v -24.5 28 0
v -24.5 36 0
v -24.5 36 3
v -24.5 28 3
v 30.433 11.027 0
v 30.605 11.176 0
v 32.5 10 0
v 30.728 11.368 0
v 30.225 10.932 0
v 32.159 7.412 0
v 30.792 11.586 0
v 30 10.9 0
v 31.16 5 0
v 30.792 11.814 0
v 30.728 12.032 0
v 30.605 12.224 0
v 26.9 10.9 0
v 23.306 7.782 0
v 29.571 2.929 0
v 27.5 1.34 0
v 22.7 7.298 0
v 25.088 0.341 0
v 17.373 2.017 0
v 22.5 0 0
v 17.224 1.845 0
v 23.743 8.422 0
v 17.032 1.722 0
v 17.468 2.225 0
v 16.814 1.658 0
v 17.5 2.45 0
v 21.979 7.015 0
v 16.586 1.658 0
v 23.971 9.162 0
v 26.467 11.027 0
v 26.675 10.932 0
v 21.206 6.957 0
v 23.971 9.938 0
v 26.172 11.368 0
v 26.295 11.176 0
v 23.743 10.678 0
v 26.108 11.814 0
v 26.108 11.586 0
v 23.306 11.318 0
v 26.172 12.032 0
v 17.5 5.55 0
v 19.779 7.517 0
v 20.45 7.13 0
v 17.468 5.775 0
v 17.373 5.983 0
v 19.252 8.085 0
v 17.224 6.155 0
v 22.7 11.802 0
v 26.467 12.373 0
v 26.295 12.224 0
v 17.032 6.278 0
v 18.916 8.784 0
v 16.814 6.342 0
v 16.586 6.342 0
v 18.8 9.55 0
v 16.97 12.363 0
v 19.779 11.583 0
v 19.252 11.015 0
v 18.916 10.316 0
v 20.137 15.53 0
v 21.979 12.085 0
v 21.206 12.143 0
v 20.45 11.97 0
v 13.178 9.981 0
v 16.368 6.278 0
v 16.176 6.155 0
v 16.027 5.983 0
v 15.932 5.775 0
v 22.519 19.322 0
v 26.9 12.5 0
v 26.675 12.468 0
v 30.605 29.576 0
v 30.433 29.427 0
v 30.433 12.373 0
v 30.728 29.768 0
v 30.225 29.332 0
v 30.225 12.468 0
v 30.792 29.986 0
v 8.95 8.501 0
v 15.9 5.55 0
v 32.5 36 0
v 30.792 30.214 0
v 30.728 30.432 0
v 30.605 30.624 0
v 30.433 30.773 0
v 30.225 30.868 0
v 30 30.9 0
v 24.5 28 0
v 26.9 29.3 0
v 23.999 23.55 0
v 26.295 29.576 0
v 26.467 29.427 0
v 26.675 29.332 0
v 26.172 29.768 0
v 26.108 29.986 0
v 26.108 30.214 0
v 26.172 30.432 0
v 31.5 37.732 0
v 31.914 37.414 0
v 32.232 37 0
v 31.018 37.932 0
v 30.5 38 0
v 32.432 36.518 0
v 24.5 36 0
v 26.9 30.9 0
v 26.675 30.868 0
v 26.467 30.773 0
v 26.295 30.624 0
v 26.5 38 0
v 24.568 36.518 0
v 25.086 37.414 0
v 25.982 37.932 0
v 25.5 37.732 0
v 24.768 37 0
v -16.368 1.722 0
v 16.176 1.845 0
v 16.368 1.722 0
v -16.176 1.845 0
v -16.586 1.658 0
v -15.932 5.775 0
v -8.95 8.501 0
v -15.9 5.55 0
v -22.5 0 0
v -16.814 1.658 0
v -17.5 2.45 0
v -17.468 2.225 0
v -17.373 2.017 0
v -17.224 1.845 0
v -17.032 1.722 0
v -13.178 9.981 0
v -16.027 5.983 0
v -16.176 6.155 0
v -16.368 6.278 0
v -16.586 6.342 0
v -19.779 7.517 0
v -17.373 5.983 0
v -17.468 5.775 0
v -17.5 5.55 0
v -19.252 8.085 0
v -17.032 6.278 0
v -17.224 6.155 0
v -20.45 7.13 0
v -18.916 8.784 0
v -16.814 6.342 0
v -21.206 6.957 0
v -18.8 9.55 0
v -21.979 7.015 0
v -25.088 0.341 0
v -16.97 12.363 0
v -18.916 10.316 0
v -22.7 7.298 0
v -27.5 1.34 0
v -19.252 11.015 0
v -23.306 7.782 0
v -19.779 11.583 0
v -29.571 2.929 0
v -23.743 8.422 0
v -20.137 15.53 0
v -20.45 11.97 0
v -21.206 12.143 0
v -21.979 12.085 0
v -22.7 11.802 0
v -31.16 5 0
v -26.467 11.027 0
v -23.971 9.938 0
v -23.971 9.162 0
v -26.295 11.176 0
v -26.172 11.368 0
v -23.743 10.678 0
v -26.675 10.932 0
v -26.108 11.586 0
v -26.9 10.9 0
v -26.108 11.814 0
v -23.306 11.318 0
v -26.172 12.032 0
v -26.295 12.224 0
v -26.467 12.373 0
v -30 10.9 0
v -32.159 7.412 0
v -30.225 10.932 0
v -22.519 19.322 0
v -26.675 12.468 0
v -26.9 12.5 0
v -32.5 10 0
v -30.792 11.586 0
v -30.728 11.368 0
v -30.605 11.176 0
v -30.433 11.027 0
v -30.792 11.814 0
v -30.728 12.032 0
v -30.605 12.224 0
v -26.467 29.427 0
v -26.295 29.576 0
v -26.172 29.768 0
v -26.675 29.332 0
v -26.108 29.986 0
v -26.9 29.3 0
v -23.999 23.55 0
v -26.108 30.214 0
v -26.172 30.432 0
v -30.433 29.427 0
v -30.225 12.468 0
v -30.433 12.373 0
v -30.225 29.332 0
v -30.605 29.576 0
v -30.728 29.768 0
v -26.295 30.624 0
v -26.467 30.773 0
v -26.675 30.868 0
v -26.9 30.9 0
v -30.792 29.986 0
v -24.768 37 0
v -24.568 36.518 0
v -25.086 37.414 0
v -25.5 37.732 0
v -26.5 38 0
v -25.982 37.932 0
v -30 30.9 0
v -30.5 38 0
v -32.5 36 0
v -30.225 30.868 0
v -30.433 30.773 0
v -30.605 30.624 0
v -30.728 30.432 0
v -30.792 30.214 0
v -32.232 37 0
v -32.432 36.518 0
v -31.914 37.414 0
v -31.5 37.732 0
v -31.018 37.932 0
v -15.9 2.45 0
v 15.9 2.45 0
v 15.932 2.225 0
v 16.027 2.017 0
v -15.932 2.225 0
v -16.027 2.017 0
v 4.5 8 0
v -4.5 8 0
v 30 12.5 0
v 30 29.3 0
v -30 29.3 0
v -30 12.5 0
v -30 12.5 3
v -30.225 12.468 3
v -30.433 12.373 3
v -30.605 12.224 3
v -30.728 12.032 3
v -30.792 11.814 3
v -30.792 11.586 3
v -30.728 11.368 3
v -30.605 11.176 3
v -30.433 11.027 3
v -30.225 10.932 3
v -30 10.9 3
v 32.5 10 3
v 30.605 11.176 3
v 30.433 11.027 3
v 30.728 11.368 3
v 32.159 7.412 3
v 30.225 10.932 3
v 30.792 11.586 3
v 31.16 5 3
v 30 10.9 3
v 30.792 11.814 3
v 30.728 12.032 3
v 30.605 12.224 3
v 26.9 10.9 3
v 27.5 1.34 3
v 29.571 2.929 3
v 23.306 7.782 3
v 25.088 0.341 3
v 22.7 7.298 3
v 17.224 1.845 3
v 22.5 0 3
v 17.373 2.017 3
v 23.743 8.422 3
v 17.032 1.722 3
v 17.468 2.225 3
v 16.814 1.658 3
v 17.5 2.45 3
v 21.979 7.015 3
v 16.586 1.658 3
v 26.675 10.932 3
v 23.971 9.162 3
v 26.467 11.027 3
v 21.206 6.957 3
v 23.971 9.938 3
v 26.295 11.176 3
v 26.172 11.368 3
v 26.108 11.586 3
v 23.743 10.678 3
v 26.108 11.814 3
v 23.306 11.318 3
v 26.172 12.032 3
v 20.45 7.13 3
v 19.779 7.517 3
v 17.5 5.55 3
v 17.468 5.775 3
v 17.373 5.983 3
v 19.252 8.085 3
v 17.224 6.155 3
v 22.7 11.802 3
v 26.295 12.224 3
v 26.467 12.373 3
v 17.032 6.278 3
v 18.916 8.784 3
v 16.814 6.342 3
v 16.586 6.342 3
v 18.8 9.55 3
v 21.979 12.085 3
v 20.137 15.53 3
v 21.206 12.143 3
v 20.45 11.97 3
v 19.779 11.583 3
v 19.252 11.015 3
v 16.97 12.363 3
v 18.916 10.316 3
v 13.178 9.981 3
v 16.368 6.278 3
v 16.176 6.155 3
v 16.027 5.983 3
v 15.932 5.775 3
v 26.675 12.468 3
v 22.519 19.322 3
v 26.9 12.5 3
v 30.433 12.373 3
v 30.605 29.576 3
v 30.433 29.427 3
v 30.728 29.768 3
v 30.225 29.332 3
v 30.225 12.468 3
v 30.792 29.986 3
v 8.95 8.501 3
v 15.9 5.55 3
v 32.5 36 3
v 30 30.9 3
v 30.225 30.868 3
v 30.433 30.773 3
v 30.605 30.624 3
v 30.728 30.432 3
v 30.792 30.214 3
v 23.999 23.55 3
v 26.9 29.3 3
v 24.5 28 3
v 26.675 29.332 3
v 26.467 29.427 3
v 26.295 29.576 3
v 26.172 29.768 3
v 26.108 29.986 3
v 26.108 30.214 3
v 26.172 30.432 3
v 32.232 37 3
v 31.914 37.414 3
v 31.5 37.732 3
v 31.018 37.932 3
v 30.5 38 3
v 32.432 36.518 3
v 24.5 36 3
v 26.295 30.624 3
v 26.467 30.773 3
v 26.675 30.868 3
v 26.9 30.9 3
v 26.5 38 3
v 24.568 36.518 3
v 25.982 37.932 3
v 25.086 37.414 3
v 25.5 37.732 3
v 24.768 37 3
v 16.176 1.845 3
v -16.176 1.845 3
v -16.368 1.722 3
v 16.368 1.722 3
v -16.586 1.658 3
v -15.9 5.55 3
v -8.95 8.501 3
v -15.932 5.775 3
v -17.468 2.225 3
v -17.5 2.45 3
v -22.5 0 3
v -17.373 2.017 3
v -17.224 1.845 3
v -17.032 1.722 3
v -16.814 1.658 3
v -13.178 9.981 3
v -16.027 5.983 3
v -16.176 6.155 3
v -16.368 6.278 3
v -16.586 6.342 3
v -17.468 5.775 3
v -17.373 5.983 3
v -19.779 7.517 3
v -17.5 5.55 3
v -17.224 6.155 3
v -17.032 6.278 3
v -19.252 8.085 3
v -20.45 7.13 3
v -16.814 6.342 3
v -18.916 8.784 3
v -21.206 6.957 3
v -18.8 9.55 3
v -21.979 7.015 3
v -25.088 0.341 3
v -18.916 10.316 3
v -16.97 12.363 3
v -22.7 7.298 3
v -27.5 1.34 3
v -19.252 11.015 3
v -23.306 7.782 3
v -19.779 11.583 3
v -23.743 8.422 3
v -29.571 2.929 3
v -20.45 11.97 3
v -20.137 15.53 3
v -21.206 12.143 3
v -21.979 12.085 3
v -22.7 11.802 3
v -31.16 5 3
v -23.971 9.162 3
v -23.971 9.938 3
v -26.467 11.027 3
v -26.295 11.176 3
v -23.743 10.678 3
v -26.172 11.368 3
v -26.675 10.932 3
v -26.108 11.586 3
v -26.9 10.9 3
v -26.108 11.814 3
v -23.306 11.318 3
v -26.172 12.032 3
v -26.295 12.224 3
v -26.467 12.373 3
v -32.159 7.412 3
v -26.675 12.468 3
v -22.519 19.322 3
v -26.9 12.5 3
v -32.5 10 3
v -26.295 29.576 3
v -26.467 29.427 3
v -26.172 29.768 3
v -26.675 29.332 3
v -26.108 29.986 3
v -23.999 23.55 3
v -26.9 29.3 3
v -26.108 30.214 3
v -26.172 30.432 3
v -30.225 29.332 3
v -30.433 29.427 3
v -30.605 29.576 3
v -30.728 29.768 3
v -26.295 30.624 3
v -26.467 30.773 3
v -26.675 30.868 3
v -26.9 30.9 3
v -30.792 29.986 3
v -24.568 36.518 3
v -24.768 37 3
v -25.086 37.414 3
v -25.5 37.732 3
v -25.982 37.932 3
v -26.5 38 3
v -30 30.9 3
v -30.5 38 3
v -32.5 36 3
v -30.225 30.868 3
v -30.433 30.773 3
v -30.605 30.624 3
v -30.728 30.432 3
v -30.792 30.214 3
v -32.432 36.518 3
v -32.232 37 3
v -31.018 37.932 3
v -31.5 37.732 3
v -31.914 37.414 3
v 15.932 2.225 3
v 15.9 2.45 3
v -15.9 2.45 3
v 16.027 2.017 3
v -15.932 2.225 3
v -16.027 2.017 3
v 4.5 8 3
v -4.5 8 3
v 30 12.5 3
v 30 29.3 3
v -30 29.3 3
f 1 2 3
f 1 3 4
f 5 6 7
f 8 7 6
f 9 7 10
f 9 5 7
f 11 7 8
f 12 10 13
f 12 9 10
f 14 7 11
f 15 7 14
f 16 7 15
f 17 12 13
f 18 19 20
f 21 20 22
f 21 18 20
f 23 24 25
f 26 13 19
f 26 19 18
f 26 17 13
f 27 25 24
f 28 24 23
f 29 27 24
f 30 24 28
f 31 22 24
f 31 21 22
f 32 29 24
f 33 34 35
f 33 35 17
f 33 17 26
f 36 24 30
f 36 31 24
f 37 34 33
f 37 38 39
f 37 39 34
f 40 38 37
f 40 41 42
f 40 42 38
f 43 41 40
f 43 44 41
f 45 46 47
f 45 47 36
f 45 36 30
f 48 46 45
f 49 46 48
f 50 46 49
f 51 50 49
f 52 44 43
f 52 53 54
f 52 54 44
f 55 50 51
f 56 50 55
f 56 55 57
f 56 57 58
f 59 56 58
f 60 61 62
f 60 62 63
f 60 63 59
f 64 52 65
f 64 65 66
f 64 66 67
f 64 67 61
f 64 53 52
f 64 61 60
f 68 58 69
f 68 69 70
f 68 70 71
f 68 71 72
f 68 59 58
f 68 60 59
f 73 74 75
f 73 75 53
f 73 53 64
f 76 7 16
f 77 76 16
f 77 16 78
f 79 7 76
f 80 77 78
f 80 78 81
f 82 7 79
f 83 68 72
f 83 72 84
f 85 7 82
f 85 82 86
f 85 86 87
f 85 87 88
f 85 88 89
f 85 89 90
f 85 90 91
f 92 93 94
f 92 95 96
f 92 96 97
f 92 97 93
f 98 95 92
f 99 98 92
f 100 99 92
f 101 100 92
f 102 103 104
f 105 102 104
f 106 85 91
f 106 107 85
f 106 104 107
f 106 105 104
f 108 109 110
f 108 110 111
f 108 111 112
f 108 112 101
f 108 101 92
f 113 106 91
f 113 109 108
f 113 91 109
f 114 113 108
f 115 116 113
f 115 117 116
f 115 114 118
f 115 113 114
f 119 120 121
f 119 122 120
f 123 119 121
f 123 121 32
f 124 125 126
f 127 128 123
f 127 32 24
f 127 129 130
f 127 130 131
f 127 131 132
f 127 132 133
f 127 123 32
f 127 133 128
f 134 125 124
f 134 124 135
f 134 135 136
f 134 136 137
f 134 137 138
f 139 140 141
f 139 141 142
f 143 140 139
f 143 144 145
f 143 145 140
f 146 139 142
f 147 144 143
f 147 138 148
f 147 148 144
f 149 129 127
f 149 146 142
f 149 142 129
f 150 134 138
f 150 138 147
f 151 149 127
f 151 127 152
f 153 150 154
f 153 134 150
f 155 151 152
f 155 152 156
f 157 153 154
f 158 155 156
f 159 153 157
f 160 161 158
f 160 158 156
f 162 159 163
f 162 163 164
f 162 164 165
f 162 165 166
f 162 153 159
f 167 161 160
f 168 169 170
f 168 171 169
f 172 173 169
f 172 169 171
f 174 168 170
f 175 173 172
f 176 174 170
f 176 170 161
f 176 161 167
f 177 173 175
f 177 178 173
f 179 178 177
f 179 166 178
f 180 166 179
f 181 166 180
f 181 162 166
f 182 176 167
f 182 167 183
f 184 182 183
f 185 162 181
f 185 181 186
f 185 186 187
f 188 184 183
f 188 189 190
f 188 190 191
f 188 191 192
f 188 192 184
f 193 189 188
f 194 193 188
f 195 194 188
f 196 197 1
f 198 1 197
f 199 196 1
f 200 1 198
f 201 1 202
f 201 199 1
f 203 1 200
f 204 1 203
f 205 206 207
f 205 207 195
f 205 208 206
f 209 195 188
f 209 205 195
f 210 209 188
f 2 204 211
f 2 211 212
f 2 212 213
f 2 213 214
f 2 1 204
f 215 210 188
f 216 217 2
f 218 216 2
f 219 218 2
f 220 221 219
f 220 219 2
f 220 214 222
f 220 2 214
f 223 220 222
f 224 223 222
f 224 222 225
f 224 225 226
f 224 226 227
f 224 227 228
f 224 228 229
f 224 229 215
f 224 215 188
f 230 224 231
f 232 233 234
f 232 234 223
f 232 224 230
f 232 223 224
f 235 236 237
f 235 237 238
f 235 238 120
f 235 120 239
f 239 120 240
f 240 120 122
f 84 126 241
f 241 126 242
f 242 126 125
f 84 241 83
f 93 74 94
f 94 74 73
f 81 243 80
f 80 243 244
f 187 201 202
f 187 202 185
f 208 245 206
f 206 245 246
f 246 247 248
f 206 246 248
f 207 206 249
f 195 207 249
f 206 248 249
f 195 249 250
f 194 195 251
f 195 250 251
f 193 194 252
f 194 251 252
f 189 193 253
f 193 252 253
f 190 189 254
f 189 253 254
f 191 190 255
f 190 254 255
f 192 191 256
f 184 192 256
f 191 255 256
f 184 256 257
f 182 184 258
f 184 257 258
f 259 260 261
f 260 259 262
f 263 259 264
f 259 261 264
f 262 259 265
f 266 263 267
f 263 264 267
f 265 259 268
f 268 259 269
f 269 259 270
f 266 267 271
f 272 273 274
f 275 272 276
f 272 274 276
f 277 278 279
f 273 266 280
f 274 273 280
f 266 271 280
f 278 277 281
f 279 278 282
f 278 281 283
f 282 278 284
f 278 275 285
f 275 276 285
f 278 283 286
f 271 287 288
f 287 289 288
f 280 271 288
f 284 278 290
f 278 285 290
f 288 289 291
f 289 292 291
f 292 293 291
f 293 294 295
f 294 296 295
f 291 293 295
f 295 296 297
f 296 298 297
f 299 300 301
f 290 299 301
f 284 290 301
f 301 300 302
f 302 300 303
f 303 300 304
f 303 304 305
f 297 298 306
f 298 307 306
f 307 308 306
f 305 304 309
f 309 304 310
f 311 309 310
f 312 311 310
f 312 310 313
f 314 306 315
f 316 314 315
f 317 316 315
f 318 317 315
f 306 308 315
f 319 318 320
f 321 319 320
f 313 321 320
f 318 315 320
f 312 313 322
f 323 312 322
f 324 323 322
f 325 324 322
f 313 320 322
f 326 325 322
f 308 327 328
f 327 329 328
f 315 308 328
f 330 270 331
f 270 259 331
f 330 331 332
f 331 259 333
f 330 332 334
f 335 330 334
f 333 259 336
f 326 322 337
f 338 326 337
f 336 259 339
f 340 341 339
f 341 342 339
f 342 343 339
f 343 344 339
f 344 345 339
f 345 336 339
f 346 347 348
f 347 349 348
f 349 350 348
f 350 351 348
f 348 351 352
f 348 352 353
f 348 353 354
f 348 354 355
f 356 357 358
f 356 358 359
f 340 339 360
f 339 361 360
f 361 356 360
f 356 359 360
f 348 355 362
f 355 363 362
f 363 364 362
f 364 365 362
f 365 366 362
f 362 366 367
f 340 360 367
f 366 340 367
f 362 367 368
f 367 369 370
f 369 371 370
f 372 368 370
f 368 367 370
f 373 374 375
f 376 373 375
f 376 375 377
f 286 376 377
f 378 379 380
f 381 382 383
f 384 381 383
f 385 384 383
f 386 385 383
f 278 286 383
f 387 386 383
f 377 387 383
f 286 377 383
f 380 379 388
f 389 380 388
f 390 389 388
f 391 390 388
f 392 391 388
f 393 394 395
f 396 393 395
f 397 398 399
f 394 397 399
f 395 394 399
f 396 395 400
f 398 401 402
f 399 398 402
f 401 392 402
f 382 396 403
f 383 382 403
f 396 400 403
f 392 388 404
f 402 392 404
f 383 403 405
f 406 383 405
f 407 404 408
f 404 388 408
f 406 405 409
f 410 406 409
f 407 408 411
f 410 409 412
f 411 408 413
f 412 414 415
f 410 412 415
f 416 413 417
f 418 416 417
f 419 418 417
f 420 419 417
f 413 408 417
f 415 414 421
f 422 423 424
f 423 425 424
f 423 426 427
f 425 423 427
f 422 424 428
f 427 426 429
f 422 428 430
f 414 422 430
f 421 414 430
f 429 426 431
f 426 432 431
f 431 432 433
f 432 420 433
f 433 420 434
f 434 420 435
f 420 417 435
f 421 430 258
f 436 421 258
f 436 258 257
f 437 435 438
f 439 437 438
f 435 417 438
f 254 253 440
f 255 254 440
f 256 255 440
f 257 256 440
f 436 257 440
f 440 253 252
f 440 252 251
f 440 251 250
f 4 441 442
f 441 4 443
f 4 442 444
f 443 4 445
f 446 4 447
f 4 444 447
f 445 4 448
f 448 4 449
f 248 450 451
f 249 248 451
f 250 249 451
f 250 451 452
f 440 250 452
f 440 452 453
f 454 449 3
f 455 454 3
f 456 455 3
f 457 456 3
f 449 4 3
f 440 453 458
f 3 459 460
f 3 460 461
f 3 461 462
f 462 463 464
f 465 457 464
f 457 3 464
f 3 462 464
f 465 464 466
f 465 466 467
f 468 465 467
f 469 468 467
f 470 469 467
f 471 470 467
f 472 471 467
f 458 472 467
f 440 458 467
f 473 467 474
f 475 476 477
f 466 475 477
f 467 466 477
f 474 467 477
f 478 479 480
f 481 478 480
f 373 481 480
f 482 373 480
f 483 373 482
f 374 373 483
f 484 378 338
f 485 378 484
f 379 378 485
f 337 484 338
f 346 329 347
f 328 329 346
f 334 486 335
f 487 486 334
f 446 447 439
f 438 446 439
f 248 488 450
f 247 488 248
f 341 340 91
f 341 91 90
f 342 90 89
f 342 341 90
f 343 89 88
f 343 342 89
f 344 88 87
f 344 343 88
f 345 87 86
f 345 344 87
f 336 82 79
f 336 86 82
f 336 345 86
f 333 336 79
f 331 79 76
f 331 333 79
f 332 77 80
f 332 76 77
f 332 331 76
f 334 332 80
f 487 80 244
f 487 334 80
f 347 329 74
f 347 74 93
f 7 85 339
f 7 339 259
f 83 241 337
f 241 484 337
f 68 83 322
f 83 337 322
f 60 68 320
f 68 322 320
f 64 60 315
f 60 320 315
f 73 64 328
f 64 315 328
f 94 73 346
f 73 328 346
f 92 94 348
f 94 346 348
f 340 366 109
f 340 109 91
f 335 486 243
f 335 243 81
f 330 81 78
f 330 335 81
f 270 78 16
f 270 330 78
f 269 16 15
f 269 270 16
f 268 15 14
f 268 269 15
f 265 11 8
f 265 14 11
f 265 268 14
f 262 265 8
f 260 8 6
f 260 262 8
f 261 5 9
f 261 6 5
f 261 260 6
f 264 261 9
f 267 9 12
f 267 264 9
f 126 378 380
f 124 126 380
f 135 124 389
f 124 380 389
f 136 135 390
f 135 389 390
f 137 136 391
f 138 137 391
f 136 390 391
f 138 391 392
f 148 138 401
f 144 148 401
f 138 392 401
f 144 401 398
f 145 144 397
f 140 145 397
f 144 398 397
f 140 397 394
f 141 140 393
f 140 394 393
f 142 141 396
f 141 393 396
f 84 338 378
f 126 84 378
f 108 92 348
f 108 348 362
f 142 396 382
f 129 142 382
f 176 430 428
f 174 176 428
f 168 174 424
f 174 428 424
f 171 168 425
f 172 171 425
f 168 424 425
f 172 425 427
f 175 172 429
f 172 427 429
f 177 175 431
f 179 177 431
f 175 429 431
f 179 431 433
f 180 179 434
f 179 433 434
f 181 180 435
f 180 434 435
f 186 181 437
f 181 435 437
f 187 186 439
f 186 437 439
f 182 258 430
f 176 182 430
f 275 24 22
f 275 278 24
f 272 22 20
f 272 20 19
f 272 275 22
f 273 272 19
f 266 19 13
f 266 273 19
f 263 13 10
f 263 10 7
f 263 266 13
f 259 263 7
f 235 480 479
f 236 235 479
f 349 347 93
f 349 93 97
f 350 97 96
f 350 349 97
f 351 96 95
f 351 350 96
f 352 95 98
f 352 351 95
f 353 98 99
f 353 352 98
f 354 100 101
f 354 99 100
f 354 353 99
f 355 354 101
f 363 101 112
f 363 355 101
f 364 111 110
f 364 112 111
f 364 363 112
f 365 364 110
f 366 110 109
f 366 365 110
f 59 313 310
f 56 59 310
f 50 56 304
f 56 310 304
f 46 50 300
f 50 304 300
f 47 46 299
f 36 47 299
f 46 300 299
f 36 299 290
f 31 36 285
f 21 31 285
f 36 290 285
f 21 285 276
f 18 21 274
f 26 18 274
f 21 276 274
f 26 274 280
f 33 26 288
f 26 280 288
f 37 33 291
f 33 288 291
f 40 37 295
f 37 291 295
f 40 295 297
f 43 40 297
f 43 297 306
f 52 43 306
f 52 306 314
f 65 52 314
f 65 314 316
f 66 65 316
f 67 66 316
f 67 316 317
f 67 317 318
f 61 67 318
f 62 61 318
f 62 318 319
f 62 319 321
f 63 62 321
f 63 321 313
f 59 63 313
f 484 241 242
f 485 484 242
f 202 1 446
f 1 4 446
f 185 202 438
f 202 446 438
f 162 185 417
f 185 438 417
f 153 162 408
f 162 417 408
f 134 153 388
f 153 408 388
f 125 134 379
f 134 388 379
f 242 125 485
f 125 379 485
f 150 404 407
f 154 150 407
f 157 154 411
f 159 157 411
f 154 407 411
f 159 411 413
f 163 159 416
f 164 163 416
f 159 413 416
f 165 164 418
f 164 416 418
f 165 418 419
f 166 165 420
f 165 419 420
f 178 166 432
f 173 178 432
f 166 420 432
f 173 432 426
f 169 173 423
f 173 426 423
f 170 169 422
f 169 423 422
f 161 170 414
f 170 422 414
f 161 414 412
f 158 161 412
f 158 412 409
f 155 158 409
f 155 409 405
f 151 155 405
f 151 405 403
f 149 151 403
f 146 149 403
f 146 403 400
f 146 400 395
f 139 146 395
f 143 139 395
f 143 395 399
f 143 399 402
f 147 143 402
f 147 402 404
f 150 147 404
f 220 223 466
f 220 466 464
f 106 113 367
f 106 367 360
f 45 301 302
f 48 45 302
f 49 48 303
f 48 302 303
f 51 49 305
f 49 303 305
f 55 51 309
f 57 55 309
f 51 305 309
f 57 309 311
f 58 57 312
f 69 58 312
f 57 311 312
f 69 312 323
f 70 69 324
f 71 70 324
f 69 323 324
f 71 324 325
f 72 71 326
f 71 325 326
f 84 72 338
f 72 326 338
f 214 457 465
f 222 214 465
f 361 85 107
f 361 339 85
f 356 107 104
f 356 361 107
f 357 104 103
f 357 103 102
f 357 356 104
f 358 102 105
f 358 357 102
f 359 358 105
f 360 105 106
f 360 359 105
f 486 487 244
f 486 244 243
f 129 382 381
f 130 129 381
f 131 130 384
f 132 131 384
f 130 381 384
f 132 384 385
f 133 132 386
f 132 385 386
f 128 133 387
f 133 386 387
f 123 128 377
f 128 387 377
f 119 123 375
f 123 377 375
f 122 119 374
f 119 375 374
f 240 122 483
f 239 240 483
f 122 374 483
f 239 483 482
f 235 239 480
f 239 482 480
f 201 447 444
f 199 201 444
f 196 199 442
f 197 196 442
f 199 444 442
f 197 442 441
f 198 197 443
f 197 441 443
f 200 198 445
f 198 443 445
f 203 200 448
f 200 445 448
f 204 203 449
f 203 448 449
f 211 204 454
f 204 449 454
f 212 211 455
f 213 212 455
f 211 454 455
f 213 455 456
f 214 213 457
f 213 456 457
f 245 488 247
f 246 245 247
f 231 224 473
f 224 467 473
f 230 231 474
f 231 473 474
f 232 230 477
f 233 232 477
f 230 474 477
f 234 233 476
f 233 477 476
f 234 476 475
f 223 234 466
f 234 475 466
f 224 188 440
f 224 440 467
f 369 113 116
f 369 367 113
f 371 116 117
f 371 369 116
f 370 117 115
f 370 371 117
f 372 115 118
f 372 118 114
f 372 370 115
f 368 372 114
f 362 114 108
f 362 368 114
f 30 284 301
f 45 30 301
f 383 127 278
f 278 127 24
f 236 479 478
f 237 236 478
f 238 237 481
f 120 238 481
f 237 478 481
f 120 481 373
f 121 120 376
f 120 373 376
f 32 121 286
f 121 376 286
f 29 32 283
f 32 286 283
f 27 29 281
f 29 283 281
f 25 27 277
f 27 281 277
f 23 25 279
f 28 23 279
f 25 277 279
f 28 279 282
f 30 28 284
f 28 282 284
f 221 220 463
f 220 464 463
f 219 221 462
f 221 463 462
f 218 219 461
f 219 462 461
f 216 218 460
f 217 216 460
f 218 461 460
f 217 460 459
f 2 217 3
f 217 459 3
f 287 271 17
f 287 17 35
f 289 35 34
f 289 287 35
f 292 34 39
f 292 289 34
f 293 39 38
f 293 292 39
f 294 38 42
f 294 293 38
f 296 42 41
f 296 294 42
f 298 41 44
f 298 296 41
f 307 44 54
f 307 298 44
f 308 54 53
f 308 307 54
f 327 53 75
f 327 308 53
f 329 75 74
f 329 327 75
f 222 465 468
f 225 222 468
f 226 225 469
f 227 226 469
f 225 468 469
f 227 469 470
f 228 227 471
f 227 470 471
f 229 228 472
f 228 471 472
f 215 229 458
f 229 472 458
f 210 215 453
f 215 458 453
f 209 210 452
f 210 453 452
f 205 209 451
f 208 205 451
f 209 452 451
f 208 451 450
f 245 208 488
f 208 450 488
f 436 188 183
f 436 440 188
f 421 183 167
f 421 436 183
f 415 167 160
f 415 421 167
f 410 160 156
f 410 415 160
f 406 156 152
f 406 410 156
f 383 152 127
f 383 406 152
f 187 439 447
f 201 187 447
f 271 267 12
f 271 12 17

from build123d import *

# Parameters (mm, degrees)
BOSS_EXTRUDE1_DEPTH = 3
FILLET1_R           = 20
CUT_EXTRUDE1_DEPTH  = 51.092414595
SKETCH3_R           = 2.6
CUT_EXTRUDE2_DEPTH  = 51.092414595
FILLET2_R           = 10
FILLET3_R           = 2


with BuildPart() as part:
    # Sketch1 → Boss-Extrude1 (new body)
    with BuildSketch(Plane.XY):
        Polygon((0, 0), (-32.5, 0), (-32.5, 38), (-24.5, 38), (-24.5, 8), (0, 8), (24.5, 8), (24.5, 38), (32.5, 38), (32.5, 0), align=None)
    extrude(amount=BOSS_EXTRUDE1_DEPTH)

    # Fillet1
    fillet1_edges = [part.edges().sort_by_distance(p)[0] for p in [
        (24.5, 8, 1.5),
        (-24.5, 8, 1.5),
    ]]
    fillet(fillet1_edges, radius=FILLET1_R)

    # Sketch2 → Cut-Extrude1 (cut, through all)
    with BuildSketch(Plane.XY.offset(3)):
        with BuildLine():
            Line((-30, 10.9), (-26.9, 10.9))
            ThreePointArc((-26.9, 10.9), (-26.1, 11.7), (-26.9, 12.5))
            Line((-26.9, 12.5), (-26.9, 29.3))
            ThreePointArc((-26.9, 29.3), (-26.1, 30.1), (-26.9, 30.9))
            Line((-26.9, 30.9), (-30, 30.9))
            ThreePointArc((-30, 30.9), (-30.8, 30.1), (-30, 29.3))
            Line((-30, 29.3), (-30, 12.5))
            ThreePointArc((-30, 12.5), (-30.8, 11.7), (-30, 10.9))
        make_face()
        with BuildLine():
            Line((26.9, 12.5), (26.9, 29.3))
            ThreePointArc((26.9, 29.3), (26.1, 30.1), (26.9, 30.9))
            Line((26.9, 30.9), (30, 30.9))
            ThreePointArc((30, 30.9), (30.8, 30.1), (30, 29.3))
            Line((30, 29.3), (30, 12.5))
            ThreePointArc((30, 12.5), (30.8, 11.7), (30, 10.9))
            Line((30, 10.9), (26.9, 10.9))
            ThreePointArc((26.9, 10.9), (26.1, 11.7), (26.9, 12.5))
        make_face()
        with BuildLine():
            Line((-15.9, 2.45), (15.9, 2.45))
            ThreePointArc((15.9, 2.45), (16.7, 1.65), (17.5, 2.45))
            Line((17.5, 2.45), (17.5, 5.55))
            ThreePointArc((17.5, 5.55), (16.7, 6.35), (15.9, 5.55))
            Line((15.9, 5.55), (-15.9, 5.55))
            ThreePointArc((-15.9, 5.55), (-16.7, 6.35), (-17.5, 5.55))
            Line((-17.5, 5.55), (-17.5, 2.45))
            ThreePointArc((-17.5, 2.45), (-16.7, 1.65), (-15.9, 2.45))
        make_face()
    extrude(amount=-CUT_EXTRUDE1_DEPTH, mode=Mode.SUBTRACT)

    # Sketch3 → Cut-Extrude2 (cut, through all)
    with BuildSketch(Plane.XY.offset(3)):
        with Locations((-21.4, 9.55)):
            Circle(SKETCH3_R)
        with Locations(Location((21.4, 9.55, 0), (0, 0, 180))):
            Circle(SKETCH3_R)
    extrude(amount=-CUT_EXTRUDE2_DEPTH, mode=Mode.SUBTRACT)

    # Fillet2
    fillet2_edges = [part.edges().sort_by_distance(p)[0] for p in [
        (32.5, 0, 1.5),
        (-32.5, 0, 1.5),
    ]]
    fillet(fillet2_edges, radius=FILLET2_R)

    # Fillet3
    fillet3_edges = [part.edges().sort_by_distance(p)[0] for p in [
        (24.5, 38, 1.5),
        (32.5, 38, 1.5),
        (-32.5, 38, 1.5),
        (-24.5, 38, 1.5),
    ]]
    fillet(fillet3_edges, radius=FILLET3_R)


solid = part.part
